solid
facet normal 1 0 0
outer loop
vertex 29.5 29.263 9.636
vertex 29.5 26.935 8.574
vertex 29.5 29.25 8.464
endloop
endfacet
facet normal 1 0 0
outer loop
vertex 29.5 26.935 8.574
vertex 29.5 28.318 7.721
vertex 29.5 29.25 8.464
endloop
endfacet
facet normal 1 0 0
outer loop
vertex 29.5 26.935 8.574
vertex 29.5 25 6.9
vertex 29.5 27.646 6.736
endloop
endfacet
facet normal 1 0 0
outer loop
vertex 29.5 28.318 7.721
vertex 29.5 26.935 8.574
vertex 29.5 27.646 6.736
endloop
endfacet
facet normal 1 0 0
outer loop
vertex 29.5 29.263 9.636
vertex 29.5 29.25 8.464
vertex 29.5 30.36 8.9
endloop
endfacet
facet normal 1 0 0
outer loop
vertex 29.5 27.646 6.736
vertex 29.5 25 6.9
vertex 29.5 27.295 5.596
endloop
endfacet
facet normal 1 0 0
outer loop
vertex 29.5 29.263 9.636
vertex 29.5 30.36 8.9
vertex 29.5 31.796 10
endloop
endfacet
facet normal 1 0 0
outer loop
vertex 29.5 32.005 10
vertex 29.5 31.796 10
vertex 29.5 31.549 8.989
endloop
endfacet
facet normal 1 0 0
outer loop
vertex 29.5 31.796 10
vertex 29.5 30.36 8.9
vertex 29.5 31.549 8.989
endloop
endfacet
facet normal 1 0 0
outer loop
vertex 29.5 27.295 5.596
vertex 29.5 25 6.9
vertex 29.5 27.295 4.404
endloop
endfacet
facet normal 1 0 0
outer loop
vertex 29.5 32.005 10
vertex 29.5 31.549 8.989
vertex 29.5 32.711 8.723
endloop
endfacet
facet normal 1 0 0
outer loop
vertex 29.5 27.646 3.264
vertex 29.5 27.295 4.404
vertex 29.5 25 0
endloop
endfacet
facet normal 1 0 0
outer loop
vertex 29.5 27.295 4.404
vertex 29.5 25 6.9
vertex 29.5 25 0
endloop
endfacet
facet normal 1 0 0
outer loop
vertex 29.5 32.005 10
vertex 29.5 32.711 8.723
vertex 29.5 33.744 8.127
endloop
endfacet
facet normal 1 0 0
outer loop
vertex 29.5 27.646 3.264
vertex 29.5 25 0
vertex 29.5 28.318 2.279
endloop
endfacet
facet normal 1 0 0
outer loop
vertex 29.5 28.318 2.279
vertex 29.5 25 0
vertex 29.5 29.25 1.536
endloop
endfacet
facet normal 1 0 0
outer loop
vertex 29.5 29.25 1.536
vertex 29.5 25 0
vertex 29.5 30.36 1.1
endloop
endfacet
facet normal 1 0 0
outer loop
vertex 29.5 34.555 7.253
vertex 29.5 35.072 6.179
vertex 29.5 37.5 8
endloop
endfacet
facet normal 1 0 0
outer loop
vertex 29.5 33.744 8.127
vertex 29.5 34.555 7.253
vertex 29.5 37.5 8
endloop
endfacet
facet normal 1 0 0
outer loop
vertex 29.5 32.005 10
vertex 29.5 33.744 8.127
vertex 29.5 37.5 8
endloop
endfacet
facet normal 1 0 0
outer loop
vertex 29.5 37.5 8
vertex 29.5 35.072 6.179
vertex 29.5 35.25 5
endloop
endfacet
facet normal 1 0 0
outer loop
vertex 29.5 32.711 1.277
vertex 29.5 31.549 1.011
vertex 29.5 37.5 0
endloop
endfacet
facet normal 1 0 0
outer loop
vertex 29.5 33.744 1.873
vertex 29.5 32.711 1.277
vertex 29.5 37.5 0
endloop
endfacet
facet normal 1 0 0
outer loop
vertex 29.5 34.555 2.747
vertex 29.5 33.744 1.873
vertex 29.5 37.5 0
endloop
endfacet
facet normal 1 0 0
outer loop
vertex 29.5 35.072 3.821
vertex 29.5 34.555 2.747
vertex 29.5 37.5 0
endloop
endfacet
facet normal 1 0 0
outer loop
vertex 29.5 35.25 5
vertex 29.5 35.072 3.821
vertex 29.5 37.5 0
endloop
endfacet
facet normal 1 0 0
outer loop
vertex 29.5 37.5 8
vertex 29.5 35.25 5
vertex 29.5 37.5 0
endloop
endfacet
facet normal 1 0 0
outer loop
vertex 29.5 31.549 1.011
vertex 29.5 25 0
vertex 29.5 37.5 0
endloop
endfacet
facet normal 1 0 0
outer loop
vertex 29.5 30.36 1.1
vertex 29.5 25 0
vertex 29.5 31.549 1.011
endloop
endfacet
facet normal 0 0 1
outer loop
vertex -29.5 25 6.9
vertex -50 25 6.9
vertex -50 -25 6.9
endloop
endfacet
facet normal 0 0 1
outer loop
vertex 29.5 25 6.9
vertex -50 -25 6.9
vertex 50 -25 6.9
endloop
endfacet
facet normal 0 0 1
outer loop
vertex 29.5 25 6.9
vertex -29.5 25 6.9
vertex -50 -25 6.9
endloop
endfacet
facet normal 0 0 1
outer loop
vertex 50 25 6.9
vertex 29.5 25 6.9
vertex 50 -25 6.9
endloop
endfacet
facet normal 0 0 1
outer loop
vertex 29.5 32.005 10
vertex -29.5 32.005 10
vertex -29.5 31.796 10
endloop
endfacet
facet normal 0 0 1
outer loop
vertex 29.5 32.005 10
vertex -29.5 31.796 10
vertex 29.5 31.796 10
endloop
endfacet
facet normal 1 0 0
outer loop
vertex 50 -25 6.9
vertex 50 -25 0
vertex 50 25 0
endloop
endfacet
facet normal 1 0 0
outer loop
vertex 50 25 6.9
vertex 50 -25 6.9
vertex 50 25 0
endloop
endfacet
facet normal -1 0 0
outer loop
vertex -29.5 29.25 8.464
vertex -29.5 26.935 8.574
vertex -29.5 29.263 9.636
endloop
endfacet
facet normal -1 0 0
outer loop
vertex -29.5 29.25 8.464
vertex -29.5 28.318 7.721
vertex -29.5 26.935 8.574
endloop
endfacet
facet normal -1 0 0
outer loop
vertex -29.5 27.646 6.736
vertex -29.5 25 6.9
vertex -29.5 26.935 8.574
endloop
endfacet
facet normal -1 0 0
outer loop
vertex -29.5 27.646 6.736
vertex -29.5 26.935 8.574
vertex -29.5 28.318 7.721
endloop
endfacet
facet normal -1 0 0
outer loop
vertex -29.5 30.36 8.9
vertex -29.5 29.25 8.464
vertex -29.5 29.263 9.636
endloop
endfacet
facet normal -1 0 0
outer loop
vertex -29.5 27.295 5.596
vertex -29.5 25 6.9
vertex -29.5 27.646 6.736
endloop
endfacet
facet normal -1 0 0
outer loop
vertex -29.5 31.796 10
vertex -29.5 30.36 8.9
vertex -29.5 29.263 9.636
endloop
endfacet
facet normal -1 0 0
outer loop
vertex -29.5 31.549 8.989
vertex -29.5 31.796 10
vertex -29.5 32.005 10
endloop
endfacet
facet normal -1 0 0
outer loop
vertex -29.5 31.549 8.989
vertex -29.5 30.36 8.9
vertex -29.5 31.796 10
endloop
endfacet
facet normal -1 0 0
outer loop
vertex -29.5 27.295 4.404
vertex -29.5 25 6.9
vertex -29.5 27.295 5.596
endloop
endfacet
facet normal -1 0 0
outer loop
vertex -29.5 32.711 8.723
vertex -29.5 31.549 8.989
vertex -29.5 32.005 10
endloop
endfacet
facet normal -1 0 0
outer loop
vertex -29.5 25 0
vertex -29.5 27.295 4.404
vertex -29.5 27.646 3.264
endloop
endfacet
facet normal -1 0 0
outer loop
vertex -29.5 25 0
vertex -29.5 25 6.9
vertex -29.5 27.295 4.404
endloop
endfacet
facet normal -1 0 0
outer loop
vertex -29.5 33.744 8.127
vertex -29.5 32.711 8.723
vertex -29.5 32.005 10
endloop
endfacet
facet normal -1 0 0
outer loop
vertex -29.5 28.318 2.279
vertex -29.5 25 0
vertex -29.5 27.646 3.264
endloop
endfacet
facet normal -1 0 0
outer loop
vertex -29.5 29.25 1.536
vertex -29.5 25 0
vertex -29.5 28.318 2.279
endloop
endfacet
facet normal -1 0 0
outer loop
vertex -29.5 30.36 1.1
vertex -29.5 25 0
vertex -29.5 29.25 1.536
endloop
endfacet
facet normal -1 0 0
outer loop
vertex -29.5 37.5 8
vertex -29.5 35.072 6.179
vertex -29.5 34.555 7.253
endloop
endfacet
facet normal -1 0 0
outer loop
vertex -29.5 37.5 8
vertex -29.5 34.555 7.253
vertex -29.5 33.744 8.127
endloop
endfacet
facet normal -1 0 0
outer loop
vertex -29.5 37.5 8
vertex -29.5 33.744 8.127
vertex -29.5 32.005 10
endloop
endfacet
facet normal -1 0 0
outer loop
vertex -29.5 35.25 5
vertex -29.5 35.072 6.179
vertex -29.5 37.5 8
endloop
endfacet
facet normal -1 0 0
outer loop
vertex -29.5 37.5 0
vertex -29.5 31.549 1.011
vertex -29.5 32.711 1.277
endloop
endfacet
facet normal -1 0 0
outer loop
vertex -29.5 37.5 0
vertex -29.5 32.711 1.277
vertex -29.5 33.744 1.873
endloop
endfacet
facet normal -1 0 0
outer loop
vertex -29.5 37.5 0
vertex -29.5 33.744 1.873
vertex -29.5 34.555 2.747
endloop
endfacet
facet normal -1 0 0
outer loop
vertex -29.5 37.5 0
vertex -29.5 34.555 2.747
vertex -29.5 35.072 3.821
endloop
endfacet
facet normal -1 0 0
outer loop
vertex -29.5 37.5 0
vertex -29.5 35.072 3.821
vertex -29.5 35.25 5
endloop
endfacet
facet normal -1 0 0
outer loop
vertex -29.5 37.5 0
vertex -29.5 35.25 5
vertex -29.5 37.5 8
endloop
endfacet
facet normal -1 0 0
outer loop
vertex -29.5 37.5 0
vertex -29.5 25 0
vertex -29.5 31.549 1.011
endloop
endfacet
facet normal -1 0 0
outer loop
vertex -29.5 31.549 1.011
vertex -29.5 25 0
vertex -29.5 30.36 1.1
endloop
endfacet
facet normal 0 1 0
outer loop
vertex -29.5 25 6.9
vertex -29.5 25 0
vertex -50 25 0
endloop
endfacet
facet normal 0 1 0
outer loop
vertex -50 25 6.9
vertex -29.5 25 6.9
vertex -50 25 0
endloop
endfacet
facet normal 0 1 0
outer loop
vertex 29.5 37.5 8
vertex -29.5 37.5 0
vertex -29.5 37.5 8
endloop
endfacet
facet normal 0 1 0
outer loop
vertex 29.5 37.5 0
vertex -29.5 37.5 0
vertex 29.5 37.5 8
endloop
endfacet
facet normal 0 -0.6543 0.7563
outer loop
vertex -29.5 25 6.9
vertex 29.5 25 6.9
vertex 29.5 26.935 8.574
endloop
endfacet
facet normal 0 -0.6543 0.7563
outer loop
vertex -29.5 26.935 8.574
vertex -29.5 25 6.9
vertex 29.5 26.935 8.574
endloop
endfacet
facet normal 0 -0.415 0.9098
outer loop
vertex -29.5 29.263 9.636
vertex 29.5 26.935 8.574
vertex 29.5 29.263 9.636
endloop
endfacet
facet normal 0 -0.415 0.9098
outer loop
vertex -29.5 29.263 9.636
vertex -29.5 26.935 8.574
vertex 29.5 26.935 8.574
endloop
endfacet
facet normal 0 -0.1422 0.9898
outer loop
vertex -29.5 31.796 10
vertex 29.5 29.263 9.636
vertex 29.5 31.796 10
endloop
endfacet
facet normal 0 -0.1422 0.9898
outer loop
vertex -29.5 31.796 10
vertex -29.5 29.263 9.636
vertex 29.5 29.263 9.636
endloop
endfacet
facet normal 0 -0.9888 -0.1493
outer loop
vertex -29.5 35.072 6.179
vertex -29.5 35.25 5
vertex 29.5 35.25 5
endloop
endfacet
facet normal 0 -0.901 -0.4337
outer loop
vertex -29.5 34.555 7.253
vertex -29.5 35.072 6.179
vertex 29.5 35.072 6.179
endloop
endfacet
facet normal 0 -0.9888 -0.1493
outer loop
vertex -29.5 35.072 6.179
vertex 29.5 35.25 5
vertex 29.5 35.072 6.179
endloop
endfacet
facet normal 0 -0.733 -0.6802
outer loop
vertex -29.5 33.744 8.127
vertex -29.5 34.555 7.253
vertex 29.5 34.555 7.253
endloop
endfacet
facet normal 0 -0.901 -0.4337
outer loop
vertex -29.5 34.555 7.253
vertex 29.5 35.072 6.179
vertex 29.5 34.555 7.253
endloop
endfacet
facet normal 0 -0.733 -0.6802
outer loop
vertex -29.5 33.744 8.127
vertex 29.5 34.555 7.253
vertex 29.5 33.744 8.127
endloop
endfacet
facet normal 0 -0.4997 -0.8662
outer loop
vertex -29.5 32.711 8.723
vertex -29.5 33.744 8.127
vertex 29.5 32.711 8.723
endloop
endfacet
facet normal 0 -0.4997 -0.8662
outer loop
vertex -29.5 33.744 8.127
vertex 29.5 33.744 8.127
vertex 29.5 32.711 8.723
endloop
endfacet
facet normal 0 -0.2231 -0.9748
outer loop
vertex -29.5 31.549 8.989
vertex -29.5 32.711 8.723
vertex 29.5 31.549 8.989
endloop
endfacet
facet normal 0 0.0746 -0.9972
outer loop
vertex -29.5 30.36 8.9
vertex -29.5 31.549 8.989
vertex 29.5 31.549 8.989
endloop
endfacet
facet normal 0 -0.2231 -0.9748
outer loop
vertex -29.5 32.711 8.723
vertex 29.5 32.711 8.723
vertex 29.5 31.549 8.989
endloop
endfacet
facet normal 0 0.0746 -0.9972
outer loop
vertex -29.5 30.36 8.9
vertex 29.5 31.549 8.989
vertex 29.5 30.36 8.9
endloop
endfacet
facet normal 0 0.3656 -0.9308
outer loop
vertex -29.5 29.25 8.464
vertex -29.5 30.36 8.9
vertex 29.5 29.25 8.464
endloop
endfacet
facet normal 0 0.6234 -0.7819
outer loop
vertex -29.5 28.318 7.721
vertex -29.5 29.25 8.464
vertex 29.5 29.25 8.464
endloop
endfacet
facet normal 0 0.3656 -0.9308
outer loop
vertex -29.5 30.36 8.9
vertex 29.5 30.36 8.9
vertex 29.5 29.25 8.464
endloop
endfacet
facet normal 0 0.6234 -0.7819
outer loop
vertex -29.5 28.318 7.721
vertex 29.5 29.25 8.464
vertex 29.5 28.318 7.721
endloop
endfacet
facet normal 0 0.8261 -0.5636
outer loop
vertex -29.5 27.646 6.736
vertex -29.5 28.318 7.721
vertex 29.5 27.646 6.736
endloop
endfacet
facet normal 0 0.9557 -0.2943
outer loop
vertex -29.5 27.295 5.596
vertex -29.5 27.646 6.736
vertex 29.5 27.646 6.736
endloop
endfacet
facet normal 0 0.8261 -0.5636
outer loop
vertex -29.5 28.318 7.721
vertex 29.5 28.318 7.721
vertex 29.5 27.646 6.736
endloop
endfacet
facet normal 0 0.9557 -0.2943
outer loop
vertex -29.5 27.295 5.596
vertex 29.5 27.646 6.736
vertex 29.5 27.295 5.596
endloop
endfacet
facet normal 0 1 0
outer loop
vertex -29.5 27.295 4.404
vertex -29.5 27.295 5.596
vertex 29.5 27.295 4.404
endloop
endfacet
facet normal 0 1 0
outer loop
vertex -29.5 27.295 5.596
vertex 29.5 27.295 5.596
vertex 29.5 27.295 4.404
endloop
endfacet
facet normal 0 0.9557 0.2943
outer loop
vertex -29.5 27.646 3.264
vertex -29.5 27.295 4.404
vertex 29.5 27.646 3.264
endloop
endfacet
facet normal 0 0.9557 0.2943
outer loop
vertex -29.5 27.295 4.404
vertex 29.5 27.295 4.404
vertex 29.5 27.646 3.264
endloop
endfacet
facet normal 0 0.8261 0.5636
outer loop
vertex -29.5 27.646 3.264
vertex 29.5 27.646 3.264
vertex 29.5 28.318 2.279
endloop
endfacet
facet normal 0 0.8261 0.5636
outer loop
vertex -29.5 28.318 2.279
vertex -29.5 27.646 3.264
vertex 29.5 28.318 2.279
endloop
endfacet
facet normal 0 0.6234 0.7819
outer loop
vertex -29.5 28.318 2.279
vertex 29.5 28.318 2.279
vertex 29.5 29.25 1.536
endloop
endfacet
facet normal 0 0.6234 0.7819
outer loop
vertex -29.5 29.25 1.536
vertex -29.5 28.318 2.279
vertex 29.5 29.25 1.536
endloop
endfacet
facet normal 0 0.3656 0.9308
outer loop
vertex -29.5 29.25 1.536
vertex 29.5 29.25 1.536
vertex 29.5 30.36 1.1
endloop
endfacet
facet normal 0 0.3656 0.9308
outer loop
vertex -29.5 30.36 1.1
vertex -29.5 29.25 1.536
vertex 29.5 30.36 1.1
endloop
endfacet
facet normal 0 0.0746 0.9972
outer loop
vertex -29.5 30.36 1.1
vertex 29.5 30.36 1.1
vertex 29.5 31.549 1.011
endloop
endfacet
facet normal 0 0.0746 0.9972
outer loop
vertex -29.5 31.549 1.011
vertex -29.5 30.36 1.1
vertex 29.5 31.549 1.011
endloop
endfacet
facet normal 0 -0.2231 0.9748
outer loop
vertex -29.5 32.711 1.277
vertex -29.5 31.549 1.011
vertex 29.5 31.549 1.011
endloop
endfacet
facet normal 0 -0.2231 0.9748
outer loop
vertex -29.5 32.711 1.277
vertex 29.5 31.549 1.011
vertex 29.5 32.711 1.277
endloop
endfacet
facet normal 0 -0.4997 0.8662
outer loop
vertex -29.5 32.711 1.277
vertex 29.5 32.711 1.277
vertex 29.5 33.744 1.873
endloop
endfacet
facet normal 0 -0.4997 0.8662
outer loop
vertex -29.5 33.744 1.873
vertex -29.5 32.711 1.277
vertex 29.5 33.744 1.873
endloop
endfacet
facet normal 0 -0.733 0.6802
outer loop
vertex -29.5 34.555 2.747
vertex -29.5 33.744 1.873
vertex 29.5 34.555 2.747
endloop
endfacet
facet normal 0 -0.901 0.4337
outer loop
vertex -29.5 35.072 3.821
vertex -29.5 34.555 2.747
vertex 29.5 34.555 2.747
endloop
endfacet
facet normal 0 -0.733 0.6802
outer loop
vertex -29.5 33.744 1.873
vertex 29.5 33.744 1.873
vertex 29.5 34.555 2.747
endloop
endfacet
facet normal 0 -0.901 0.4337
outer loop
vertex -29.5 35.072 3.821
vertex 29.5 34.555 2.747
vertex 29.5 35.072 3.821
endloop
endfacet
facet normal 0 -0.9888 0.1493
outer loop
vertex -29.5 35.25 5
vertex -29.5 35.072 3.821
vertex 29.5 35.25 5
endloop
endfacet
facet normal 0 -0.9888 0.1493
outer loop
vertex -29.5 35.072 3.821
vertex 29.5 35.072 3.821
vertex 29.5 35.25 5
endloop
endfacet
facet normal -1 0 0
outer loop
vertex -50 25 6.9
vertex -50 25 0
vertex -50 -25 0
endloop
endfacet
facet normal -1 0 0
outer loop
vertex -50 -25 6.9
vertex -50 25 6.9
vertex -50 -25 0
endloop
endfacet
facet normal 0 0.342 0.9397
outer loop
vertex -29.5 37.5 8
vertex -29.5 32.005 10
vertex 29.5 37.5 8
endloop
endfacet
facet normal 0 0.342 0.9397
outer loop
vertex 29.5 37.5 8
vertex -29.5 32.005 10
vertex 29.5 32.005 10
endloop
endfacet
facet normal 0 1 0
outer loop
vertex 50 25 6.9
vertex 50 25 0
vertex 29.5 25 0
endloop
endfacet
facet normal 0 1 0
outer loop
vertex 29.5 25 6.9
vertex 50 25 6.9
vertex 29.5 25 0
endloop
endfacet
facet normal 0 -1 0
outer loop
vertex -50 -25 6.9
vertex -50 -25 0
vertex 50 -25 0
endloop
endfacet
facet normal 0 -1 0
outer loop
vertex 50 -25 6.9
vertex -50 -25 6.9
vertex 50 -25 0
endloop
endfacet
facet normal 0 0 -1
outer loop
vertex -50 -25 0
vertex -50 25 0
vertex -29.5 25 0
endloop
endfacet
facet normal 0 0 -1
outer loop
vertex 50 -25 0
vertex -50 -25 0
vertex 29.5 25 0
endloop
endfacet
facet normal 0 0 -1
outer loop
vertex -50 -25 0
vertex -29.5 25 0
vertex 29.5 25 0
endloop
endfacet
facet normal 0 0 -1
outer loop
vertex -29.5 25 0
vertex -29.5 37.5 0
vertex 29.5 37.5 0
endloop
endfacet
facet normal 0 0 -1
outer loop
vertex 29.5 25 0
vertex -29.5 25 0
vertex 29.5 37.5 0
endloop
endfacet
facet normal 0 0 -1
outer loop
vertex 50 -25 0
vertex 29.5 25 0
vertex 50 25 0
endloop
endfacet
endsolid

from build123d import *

# Parameters (mm, degrees)
F0_W        = 59
F0_H        = 12.5
F1_DEPTH    = 10
F2_DEPTH    = 6.9
F3_R        = 4
F4_DEPTH    = 59
F5_T1_DEPTH = 92.9816126751
F6_SIZE2    = 5.4949548389
F6_SIZE     = 2


# Not quite as in the source:
# - a fillet or chamfer that OpenCascade refuses, or shapes differently, is made with other operations: its cross-section is extruded or revolved along the edge and cut away or added


with BuildPart() as f1:
    # F0 (on Top) → F1 (new body)
    with BuildSketch(Plane.XY):
        with Locations((0, 31.25)):
            Rectangle(F0_W, F0_H)
    extrude(amount=F1_DEPTH)

    # F0 (on Top) → F2 (join)
    with BuildSketch(Plane.XY):
        Polygon((-50, -25), (50, -25), (50, 25), (29.5, 25), (-29.5, 25), (-50, 25), align=None)
    extrude(amount=F2_DEPTH)

    # F3 (on face) → F4 (cut, through all)
    with BuildSketch(Plane.YZ.offset(29.5)):
        with Locations((31.25, 5)):
            Circle(F3_R)
    extrude(amount=-F4_DEPTH, mode=Mode.SUBTRACT)

    # F5: fillet of radius 9 on 1 edges, made by hand

    # F5_s2 → F5_t1 (cut)
    with BuildSketch(Plane.YZ.offset(-46.4908063375)):
        with BuildLine():
            ThreePointArc((25, 6.9), (28.0613526556, 9.1884064384), (31.796322535, 10))
            Line((31.796322535, 10), (25, 10))
            Line((25, 10), (25, 6.9))
        make_face()
    extrude(amount=F5_T1_DEPTH, mode=Mode.SUBTRACT)

    # F6
    f6_edges = [f1.edges().sort_by_distance(p)[0] for p in [
        (0, 37.5, 10),
    ]]
    f6_side = f1.faces().sort_by_distance((0, 37.5, 5))[0]
    chamfer(f6_edges, length=F6_SIZE, length2=F6_SIZE2, reference=f6_side)


solid = f1.part
